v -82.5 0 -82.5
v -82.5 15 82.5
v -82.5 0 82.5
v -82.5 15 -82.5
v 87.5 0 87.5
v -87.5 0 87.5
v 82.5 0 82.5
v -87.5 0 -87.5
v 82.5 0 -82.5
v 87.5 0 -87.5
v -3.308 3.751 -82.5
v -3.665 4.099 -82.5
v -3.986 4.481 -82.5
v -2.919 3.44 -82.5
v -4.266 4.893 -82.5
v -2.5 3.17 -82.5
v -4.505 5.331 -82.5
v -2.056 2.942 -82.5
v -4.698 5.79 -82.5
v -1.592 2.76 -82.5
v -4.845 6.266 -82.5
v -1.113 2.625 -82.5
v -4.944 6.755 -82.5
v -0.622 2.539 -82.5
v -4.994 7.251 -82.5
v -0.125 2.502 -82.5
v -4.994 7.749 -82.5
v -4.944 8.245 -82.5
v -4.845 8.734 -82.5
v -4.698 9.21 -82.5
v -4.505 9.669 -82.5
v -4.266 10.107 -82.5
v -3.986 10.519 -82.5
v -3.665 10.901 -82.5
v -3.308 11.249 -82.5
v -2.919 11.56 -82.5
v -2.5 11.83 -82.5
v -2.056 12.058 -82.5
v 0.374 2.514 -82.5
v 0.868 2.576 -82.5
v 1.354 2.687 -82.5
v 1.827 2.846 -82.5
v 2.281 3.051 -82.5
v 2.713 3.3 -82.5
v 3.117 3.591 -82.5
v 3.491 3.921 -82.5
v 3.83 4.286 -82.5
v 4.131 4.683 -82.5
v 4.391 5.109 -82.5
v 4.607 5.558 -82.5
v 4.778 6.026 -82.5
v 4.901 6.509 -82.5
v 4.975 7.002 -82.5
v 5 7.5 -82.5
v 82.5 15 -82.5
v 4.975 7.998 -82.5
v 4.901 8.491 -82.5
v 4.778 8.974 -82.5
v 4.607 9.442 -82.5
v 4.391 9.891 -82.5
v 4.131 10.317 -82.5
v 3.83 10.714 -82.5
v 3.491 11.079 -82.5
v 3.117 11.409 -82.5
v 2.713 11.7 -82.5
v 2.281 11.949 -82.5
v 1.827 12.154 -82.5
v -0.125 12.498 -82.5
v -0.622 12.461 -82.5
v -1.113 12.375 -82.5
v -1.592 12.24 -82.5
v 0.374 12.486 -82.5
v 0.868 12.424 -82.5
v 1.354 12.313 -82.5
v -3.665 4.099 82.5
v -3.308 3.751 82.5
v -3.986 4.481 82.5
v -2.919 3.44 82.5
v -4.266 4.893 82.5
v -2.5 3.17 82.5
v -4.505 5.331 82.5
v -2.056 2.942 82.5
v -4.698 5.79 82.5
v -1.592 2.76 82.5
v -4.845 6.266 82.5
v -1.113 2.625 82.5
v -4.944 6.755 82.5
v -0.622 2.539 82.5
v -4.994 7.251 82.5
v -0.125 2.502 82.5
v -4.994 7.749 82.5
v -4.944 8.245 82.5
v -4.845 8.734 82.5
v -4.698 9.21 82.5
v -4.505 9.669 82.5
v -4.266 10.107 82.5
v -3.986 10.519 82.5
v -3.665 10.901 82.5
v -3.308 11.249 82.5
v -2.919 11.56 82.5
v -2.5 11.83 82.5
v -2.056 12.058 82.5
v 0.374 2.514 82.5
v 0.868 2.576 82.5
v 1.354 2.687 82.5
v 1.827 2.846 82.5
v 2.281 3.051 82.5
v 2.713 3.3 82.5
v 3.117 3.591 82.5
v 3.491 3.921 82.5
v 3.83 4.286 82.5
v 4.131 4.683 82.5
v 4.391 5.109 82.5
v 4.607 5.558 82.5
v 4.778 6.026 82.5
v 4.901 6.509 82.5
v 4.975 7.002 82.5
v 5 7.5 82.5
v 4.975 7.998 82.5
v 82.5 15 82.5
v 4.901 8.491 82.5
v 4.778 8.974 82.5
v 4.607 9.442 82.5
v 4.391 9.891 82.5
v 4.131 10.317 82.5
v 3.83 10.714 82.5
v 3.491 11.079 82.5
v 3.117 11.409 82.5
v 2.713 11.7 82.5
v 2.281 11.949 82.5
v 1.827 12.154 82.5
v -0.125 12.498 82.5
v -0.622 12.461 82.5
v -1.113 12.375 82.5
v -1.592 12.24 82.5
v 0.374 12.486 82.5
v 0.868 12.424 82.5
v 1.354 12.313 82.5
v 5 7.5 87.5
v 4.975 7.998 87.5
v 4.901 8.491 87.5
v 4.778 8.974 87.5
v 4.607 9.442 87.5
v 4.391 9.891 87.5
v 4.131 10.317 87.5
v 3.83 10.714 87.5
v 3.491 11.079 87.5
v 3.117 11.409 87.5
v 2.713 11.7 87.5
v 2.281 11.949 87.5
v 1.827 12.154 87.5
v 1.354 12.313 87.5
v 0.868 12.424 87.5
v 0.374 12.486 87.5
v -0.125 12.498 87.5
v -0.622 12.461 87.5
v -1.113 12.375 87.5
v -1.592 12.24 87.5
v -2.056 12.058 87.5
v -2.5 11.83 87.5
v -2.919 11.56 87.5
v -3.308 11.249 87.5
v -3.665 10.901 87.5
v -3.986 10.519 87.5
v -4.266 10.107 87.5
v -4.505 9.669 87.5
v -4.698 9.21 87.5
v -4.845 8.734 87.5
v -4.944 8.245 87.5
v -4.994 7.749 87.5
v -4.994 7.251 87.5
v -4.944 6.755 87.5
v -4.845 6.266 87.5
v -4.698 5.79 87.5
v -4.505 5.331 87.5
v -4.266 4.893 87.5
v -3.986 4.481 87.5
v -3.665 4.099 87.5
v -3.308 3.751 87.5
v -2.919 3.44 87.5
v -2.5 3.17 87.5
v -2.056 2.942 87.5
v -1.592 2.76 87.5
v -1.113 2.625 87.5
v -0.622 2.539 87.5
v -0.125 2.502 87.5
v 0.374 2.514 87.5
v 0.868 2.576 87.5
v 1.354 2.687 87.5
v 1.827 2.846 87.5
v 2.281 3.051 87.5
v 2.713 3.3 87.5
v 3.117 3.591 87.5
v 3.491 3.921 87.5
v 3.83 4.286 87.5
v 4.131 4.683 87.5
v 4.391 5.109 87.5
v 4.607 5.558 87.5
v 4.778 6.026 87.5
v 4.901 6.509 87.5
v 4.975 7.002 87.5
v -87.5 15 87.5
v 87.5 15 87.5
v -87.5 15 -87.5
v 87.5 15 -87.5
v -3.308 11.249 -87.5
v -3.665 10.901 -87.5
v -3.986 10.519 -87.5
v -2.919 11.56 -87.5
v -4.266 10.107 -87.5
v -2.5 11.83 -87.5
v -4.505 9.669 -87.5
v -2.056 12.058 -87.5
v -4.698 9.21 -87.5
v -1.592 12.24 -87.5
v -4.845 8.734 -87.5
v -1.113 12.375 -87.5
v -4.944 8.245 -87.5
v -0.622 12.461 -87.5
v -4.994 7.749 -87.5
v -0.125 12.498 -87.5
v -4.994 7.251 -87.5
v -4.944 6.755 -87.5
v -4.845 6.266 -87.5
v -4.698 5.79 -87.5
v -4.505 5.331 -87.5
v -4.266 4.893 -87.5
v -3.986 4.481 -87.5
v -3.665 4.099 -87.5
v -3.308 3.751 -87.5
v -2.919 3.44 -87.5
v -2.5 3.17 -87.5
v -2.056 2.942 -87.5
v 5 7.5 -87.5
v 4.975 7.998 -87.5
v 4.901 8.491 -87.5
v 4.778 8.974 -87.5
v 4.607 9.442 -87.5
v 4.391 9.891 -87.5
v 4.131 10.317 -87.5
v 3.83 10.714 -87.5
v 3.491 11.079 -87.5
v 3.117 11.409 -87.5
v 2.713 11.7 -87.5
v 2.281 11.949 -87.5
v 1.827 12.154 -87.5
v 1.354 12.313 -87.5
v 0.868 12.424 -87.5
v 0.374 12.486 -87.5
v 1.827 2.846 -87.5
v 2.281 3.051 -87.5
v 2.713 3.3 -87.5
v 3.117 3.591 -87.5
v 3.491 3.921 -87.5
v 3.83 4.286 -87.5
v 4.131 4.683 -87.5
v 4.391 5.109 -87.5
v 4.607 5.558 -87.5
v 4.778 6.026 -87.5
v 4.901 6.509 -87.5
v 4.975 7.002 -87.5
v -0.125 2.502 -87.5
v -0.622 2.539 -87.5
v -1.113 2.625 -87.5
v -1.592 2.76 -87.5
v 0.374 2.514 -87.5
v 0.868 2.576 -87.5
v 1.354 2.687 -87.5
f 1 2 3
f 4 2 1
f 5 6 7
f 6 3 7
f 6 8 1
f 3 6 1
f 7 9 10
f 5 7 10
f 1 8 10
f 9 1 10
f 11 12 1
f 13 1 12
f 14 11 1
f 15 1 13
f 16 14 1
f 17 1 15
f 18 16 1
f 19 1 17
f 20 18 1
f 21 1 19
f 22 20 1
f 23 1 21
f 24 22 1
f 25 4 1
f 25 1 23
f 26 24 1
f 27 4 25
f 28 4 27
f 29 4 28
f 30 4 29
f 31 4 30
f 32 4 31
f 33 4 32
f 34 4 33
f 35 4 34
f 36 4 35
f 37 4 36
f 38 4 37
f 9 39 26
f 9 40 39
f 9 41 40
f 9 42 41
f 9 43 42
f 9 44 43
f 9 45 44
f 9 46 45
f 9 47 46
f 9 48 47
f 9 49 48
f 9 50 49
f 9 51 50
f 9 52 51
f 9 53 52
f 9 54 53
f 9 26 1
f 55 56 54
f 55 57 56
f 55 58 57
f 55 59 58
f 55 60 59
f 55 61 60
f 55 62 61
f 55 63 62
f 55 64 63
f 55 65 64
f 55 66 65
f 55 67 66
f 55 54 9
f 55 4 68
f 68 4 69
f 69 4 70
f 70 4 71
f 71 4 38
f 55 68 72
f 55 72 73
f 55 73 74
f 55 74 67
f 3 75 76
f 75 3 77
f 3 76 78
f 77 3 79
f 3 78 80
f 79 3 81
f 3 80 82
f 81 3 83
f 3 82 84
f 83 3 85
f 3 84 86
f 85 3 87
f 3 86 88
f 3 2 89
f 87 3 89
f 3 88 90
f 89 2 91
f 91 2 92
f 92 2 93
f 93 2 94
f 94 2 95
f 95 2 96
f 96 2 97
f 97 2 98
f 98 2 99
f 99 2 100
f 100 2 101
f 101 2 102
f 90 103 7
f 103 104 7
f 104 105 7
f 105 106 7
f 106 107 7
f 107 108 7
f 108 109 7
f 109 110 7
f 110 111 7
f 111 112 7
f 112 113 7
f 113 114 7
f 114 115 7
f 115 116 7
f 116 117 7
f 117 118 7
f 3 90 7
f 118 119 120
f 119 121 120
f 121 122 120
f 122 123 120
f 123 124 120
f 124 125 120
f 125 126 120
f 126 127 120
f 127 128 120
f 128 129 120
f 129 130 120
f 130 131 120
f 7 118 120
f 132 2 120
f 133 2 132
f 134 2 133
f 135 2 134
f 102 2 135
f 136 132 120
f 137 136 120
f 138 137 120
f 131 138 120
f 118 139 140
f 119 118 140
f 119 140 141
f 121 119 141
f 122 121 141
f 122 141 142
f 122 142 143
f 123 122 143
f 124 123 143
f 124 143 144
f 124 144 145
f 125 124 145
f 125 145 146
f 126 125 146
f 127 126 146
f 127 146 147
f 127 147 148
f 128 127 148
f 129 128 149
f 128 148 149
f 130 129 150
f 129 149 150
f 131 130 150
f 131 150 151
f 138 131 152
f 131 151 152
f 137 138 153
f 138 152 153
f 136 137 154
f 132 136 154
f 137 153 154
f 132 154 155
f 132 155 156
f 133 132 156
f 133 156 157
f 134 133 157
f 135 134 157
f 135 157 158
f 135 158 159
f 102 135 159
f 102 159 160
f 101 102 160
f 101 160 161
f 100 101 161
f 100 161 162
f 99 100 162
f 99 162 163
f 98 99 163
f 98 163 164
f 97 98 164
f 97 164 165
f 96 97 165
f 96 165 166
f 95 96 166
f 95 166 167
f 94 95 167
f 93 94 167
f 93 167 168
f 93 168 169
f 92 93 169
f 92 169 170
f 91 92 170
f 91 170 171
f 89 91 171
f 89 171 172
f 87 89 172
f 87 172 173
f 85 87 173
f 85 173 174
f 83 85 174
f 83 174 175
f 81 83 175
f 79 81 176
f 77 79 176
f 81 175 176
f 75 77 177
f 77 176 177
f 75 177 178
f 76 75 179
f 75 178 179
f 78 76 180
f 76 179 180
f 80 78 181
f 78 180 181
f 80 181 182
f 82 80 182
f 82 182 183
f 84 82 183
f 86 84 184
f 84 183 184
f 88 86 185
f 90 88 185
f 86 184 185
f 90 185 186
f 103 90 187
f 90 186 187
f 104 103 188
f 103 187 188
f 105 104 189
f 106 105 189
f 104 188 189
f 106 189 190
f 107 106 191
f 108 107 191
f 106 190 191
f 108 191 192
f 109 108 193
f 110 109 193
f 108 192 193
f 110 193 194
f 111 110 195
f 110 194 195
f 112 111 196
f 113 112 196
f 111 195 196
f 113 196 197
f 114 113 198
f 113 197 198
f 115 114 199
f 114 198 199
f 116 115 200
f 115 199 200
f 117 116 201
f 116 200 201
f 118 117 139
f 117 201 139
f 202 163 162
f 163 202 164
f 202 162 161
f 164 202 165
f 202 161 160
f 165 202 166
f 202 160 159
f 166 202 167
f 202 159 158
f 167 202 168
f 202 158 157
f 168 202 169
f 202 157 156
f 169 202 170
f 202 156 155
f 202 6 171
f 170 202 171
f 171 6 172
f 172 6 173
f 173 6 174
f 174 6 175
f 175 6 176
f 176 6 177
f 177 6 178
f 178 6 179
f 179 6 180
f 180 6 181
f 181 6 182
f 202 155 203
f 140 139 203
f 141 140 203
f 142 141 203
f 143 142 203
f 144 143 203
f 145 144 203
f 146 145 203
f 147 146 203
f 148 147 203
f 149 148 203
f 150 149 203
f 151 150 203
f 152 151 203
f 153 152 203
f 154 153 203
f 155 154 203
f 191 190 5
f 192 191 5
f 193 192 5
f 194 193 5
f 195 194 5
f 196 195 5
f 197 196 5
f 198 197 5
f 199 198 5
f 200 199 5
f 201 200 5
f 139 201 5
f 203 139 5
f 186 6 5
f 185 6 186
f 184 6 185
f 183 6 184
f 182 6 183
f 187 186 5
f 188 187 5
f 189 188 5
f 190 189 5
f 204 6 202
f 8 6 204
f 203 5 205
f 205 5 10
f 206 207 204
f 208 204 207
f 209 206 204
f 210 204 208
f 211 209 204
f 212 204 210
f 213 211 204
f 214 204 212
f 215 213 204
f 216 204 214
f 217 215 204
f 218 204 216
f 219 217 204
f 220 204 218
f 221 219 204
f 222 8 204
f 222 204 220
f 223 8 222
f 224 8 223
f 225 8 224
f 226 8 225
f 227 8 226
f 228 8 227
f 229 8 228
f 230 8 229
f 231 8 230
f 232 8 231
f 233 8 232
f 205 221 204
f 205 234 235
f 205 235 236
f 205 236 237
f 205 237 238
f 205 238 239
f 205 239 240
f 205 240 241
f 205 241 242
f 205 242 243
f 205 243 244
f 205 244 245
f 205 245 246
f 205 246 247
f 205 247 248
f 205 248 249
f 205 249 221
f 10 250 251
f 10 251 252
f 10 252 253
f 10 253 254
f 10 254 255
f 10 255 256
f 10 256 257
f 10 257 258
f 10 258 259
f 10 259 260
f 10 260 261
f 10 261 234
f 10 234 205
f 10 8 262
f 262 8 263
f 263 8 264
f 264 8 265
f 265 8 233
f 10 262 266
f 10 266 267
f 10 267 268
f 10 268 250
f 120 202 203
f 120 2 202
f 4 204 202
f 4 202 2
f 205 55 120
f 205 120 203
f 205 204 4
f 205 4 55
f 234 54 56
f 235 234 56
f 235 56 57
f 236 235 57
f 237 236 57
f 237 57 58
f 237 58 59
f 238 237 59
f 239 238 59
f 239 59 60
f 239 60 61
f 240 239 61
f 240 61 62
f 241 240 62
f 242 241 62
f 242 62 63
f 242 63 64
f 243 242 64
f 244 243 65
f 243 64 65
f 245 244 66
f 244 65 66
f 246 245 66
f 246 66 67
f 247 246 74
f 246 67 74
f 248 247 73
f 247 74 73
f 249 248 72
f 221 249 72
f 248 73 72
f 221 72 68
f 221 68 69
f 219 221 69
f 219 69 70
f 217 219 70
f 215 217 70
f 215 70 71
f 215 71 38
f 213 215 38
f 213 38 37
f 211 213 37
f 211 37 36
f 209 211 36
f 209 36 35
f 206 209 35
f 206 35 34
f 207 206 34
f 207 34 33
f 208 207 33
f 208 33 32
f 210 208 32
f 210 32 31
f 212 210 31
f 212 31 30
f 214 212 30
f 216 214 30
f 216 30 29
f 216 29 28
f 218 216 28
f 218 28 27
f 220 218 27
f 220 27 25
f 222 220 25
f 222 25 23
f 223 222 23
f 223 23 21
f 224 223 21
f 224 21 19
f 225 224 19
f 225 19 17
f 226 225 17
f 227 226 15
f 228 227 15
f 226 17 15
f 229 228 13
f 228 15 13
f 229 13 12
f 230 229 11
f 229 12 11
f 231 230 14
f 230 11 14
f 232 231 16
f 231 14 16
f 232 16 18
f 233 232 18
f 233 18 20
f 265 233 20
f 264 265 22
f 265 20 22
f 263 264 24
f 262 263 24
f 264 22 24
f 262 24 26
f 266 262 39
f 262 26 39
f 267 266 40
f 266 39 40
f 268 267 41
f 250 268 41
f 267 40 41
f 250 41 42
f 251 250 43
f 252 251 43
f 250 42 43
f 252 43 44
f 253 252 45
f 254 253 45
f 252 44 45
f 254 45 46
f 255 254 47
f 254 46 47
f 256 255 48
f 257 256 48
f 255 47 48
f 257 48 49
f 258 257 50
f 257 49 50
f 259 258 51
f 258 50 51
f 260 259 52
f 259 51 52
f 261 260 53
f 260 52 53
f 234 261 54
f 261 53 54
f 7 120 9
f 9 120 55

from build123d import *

# Parameters (mm, degrees)
SKETCH1_W           = 175
SKETCH1_H           = 175
BOSS_EXTRUDE1_DEPTH = 15
SKETCH2_W           = 165
SKETCH2_H           = 165
CUT_EXTRUDE1_DEPTH  = 15
SKETCH3_R           = 5
CUT_EXTRUDE2_DEPTH  = 197.230094532


with BuildPart() as part:
    # Sketch1 → Boss-Extrude1 (new body)
    with BuildSketch(Plane(origin=(0, 0, 0), x_dir=(1, 0, 0), z_dir=(0, 1, 0))):
        Rectangle(SKETCH1_W, SKETCH1_H)
    extrude(amount=BOSS_EXTRUDE1_DEPTH)

    # Sketch2 → Cut-Extrude1 (cut)
    with BuildSketch(Plane(origin=(0, 15, 0), x_dir=(1, 0, 0), z_dir=(0, 1, 0))):
        Rectangle(SKETCH2_W, SKETCH2_H)
    extrude(amount=-CUT_EXTRUDE1_DEPTH, mode=Mode.SUBTRACT)

    # Sketch3 → Cut-Extrude2 (cut, through all)
    with BuildSketch(Plane.XY.offset(87.5)):
        with Locations((0, 7.5)):
            Circle(SKETCH3_R)
    extrude(amount=-CUT_EXTRUDE2_DEPTH, mode=Mode.SUBTRACT)


solid = part.part
